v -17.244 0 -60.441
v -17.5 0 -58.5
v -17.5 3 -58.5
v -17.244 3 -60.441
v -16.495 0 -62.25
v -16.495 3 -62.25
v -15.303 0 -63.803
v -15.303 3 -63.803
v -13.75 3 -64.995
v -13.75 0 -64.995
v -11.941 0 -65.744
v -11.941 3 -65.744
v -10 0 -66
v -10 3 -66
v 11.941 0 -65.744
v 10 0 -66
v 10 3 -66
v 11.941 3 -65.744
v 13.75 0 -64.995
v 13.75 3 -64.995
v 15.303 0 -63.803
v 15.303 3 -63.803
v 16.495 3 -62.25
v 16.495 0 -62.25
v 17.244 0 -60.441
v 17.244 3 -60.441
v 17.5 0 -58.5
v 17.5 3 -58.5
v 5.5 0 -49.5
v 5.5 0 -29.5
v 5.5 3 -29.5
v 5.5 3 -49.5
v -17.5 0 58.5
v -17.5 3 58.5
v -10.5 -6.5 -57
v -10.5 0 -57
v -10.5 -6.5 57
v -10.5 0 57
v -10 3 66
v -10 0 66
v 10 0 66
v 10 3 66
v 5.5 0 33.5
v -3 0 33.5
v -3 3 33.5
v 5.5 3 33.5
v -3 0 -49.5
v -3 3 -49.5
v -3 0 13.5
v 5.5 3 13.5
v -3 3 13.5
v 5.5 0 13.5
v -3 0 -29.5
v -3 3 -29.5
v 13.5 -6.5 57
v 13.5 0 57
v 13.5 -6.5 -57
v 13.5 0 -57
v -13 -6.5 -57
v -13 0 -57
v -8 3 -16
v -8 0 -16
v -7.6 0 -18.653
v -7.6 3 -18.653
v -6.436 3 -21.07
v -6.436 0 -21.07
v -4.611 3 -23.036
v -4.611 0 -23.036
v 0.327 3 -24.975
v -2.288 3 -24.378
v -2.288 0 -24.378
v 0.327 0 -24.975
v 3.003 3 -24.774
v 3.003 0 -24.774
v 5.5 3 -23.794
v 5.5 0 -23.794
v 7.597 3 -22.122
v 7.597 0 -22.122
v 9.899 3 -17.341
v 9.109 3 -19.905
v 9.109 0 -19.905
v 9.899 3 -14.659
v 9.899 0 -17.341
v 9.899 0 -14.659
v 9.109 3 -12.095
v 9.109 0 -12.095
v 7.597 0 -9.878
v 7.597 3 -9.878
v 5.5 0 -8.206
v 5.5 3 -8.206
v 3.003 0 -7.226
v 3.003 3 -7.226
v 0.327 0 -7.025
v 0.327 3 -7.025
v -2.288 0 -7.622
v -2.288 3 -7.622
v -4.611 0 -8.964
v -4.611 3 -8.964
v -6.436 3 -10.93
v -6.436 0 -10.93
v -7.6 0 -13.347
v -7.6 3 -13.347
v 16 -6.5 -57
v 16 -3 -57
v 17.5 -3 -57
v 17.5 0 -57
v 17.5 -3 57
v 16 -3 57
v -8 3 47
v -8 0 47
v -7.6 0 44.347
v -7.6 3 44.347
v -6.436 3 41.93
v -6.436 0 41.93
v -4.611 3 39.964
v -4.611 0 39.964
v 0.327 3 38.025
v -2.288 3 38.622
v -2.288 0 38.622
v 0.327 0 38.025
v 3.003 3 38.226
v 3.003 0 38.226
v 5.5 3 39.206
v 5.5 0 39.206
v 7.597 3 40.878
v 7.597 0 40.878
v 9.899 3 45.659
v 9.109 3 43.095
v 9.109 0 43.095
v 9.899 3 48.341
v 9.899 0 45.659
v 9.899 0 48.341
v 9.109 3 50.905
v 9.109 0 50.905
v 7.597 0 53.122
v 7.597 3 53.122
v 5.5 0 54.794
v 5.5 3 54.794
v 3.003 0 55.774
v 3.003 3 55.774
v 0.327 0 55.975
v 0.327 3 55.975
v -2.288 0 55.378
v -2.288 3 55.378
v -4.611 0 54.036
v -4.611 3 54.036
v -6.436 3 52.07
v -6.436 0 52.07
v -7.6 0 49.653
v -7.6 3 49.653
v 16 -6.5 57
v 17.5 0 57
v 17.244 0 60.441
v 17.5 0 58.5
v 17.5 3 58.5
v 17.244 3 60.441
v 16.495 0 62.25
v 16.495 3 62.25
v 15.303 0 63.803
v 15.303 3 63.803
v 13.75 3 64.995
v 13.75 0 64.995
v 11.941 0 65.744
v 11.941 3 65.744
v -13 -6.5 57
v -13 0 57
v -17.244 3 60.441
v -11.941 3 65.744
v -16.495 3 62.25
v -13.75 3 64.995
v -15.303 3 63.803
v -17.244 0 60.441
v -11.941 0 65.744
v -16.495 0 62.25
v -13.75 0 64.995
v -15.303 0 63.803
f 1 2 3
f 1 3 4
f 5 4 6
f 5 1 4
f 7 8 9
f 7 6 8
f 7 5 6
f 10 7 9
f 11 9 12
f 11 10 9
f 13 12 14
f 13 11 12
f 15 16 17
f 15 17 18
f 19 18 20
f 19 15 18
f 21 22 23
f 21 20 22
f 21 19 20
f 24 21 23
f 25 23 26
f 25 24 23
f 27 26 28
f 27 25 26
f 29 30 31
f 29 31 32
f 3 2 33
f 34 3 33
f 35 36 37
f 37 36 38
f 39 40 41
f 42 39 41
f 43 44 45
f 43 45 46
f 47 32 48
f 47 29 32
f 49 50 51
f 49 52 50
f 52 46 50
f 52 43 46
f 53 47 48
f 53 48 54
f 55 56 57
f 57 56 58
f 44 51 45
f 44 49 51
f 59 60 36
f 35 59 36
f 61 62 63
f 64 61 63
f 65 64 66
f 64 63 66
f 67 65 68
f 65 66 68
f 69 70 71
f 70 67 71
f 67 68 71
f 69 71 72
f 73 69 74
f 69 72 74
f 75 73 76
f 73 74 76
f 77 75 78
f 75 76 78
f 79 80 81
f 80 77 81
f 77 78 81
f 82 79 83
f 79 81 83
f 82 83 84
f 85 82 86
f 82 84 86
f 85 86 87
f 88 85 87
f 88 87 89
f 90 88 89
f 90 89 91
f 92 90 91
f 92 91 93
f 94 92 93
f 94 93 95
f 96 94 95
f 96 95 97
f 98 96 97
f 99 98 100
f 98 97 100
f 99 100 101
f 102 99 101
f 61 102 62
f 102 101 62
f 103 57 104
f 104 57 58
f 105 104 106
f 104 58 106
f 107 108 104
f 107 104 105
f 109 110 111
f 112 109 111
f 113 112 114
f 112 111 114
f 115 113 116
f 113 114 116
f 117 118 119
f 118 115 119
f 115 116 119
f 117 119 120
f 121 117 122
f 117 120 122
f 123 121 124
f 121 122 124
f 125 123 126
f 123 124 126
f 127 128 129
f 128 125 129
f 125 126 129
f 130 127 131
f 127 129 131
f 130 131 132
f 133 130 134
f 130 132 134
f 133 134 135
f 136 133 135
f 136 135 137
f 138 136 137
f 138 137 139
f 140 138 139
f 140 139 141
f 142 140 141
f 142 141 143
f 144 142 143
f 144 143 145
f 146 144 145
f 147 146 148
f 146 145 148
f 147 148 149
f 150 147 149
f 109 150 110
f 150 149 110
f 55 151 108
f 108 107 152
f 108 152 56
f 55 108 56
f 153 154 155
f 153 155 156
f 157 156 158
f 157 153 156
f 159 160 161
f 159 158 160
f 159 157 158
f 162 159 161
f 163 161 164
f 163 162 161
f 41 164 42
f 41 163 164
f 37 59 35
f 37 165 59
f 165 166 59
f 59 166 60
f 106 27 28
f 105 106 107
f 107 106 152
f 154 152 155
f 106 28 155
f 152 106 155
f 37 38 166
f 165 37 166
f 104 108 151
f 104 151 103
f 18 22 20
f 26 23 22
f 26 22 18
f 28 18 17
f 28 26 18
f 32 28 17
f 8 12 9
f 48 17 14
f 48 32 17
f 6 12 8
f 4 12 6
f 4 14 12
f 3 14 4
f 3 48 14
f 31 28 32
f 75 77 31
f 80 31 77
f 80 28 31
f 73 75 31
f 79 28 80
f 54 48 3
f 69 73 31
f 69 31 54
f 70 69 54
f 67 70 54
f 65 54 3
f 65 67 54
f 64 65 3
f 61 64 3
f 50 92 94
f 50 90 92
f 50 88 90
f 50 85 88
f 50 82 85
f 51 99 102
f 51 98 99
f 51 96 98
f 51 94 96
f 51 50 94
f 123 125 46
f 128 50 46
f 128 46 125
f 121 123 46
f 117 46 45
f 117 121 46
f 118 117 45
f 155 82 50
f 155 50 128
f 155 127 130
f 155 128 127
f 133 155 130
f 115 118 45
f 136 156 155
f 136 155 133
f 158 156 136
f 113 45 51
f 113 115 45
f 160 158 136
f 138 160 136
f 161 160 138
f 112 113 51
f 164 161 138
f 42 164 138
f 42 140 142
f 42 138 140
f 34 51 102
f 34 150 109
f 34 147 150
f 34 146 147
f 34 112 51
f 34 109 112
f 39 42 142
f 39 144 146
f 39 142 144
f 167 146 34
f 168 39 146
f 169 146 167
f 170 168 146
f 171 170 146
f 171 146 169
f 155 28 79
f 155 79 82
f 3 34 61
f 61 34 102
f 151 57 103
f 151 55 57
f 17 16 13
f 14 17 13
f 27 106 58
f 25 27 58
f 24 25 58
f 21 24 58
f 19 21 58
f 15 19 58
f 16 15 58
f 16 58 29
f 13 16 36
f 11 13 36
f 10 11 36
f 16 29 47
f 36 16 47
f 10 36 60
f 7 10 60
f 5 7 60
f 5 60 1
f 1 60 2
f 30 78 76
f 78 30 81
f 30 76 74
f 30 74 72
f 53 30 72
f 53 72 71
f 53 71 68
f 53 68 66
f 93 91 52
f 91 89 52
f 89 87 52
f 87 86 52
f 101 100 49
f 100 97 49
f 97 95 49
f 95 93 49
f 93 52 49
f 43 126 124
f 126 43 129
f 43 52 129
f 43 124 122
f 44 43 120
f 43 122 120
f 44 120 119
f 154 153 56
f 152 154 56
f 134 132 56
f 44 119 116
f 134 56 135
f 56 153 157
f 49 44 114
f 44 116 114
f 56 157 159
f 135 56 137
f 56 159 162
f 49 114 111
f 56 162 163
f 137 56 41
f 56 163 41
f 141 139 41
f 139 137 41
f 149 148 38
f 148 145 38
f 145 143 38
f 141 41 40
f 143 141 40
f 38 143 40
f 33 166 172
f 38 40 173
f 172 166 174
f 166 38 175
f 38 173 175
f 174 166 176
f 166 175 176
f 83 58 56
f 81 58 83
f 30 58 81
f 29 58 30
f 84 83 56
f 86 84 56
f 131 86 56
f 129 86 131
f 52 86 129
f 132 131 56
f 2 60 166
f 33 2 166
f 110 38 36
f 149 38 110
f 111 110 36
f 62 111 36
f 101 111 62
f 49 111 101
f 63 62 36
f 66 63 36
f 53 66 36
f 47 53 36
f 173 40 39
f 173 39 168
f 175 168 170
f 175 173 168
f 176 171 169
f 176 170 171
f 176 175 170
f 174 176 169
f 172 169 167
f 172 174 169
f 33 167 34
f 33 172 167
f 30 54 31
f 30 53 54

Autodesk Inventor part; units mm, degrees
ref_plane "YZ Plane" through (0, 0, 0) normal (1, 0, 0) x (0, 1, 0)
ref_plane "XZ Plane" through (0, 0, 0) normal (0, 1, 0) x (-1, 0, 0)
ref_plane "XY Plane" through (0, 0, 0) normal (0, 0, 1) x (1, 0, 0)
sketch "Boceto1" plane through (0, 0, 0) normal (0, 1, 0) x (-1, 0, 0)
  line L0 (10, 66) -> (-10, 66)
  line L1 (-17.5, 58.5) -> (-17.5, -58.5)
  line L2 (-10, -66) -> (10, -66)
  line L3 (17.5, -58.5) -> (17.5, 58.5)
  arc A0 (17.5, 58.5) -> (10, 66) centre (10, 58.5) ccw
  arc A1 (-10, 66) -> (-17.5, 58.5) centre (-10, 58.5) ccw
  arc A2 (-17.5, -58.5) -> (-10, -66) centre (-10, -58.5) ccw
  arc A3 (10, -66) -> (17.5, -58.5) centre (10, -58.5) ccw
  circle A4 centre (-1, 47) radius 9
  circle A5 centre (-1, -16) radius 9
  line L4 (3, 33.5) -> (-5.5, 33.5)
  line L5 (-5.5, 33.5) -> (-5.5, 13.5)
  line L6 (-5.5, 13.5) -> (3, 13.5)
  line L7 (3, 13.5) -> (3, 33.5)
  line L8 (3, -29.5) -> (-5.5, -29.5)
  line L9 (-5.5, -29.5) -> (-5.5, -49.5)
  line L10 (-5.5, -49.5) -> (3, -49.5)
  line L11 (3, -49.5) -> (3, -29.5)
  point P0 (0, 0)
  point P1 (17.5, 66)
  point P2 (-17.5, -66)
  point P3 (17.5, -66)
  point P4 (17.5, 0)
  point P5 (0, -66)
  point P6 (-1.25, 13.5)
  point P7 (-1.25, -49.5)
  point P8 (-1.25, 33.5)
  dimension "d0" = 35
  dimension "d1" = 132
  dimension "d2" = 7.5
  dimension "d5" = 8.5
  dimension "d8" = 20
  dimension "d9" = 12
  dimension "d10" = 43
  dimension "d11" = 16.5
  dimension "d12" = 13.5
  dimension "d13" = 16.5
  dimension "d15" = 18
  dimension "d16" = 13.5
extrude "Extrusión1" add sketch "Boceto1" along normal blind 3
sketch "Boceto2" plane through (0, 0, 0) normal (0, -1, 0) x (1, 0, 0)
  line L0 (17.5, 57) -> (13.5, 57)
  line L1 (13.5, 57) -> (13.5, -57)
  line L2 (13.5, -57) -> (17.5, -57)
  line L3 (17.5, -57) -> (17.5, 57)
  line L4 (-10.5, 57) -> (-13, 57)
  line L5 (-13, 57) -> (-13, -57)
  line L6 (-13, -57) -> (-10.5, -57)
  line L7 (-10.5, -57) -> (-10.5, 57)
  line L8 (16, 57) -> (16, -57)
  line L9 (17.5, 58.5) -> (17.5, -58.5) projected
  point P0 (0, 0)
  point P1 (17.5, 0)
  point P2 (17.5, 0)
  point P3 (-10.5, 0)
  point P4 (13.5, 0)
  dimension "d19" = 4
  dimension "d20" = 114
  dimension "d21" = 2.5
  dimension "d22" = 2.5
  dimension "d23" = 24
extrude "Extrusión2" add sketch "Boceto2" along normal blind 6.5 contours L8 L2 L1 L0 | L7 L6 L5 L4
extrude "Extrusión3" add sketch "Boceto2" along normal blind 3 contours L3 L2 L8 L0
properties part number "Soporte" material "Plástico ABS"
